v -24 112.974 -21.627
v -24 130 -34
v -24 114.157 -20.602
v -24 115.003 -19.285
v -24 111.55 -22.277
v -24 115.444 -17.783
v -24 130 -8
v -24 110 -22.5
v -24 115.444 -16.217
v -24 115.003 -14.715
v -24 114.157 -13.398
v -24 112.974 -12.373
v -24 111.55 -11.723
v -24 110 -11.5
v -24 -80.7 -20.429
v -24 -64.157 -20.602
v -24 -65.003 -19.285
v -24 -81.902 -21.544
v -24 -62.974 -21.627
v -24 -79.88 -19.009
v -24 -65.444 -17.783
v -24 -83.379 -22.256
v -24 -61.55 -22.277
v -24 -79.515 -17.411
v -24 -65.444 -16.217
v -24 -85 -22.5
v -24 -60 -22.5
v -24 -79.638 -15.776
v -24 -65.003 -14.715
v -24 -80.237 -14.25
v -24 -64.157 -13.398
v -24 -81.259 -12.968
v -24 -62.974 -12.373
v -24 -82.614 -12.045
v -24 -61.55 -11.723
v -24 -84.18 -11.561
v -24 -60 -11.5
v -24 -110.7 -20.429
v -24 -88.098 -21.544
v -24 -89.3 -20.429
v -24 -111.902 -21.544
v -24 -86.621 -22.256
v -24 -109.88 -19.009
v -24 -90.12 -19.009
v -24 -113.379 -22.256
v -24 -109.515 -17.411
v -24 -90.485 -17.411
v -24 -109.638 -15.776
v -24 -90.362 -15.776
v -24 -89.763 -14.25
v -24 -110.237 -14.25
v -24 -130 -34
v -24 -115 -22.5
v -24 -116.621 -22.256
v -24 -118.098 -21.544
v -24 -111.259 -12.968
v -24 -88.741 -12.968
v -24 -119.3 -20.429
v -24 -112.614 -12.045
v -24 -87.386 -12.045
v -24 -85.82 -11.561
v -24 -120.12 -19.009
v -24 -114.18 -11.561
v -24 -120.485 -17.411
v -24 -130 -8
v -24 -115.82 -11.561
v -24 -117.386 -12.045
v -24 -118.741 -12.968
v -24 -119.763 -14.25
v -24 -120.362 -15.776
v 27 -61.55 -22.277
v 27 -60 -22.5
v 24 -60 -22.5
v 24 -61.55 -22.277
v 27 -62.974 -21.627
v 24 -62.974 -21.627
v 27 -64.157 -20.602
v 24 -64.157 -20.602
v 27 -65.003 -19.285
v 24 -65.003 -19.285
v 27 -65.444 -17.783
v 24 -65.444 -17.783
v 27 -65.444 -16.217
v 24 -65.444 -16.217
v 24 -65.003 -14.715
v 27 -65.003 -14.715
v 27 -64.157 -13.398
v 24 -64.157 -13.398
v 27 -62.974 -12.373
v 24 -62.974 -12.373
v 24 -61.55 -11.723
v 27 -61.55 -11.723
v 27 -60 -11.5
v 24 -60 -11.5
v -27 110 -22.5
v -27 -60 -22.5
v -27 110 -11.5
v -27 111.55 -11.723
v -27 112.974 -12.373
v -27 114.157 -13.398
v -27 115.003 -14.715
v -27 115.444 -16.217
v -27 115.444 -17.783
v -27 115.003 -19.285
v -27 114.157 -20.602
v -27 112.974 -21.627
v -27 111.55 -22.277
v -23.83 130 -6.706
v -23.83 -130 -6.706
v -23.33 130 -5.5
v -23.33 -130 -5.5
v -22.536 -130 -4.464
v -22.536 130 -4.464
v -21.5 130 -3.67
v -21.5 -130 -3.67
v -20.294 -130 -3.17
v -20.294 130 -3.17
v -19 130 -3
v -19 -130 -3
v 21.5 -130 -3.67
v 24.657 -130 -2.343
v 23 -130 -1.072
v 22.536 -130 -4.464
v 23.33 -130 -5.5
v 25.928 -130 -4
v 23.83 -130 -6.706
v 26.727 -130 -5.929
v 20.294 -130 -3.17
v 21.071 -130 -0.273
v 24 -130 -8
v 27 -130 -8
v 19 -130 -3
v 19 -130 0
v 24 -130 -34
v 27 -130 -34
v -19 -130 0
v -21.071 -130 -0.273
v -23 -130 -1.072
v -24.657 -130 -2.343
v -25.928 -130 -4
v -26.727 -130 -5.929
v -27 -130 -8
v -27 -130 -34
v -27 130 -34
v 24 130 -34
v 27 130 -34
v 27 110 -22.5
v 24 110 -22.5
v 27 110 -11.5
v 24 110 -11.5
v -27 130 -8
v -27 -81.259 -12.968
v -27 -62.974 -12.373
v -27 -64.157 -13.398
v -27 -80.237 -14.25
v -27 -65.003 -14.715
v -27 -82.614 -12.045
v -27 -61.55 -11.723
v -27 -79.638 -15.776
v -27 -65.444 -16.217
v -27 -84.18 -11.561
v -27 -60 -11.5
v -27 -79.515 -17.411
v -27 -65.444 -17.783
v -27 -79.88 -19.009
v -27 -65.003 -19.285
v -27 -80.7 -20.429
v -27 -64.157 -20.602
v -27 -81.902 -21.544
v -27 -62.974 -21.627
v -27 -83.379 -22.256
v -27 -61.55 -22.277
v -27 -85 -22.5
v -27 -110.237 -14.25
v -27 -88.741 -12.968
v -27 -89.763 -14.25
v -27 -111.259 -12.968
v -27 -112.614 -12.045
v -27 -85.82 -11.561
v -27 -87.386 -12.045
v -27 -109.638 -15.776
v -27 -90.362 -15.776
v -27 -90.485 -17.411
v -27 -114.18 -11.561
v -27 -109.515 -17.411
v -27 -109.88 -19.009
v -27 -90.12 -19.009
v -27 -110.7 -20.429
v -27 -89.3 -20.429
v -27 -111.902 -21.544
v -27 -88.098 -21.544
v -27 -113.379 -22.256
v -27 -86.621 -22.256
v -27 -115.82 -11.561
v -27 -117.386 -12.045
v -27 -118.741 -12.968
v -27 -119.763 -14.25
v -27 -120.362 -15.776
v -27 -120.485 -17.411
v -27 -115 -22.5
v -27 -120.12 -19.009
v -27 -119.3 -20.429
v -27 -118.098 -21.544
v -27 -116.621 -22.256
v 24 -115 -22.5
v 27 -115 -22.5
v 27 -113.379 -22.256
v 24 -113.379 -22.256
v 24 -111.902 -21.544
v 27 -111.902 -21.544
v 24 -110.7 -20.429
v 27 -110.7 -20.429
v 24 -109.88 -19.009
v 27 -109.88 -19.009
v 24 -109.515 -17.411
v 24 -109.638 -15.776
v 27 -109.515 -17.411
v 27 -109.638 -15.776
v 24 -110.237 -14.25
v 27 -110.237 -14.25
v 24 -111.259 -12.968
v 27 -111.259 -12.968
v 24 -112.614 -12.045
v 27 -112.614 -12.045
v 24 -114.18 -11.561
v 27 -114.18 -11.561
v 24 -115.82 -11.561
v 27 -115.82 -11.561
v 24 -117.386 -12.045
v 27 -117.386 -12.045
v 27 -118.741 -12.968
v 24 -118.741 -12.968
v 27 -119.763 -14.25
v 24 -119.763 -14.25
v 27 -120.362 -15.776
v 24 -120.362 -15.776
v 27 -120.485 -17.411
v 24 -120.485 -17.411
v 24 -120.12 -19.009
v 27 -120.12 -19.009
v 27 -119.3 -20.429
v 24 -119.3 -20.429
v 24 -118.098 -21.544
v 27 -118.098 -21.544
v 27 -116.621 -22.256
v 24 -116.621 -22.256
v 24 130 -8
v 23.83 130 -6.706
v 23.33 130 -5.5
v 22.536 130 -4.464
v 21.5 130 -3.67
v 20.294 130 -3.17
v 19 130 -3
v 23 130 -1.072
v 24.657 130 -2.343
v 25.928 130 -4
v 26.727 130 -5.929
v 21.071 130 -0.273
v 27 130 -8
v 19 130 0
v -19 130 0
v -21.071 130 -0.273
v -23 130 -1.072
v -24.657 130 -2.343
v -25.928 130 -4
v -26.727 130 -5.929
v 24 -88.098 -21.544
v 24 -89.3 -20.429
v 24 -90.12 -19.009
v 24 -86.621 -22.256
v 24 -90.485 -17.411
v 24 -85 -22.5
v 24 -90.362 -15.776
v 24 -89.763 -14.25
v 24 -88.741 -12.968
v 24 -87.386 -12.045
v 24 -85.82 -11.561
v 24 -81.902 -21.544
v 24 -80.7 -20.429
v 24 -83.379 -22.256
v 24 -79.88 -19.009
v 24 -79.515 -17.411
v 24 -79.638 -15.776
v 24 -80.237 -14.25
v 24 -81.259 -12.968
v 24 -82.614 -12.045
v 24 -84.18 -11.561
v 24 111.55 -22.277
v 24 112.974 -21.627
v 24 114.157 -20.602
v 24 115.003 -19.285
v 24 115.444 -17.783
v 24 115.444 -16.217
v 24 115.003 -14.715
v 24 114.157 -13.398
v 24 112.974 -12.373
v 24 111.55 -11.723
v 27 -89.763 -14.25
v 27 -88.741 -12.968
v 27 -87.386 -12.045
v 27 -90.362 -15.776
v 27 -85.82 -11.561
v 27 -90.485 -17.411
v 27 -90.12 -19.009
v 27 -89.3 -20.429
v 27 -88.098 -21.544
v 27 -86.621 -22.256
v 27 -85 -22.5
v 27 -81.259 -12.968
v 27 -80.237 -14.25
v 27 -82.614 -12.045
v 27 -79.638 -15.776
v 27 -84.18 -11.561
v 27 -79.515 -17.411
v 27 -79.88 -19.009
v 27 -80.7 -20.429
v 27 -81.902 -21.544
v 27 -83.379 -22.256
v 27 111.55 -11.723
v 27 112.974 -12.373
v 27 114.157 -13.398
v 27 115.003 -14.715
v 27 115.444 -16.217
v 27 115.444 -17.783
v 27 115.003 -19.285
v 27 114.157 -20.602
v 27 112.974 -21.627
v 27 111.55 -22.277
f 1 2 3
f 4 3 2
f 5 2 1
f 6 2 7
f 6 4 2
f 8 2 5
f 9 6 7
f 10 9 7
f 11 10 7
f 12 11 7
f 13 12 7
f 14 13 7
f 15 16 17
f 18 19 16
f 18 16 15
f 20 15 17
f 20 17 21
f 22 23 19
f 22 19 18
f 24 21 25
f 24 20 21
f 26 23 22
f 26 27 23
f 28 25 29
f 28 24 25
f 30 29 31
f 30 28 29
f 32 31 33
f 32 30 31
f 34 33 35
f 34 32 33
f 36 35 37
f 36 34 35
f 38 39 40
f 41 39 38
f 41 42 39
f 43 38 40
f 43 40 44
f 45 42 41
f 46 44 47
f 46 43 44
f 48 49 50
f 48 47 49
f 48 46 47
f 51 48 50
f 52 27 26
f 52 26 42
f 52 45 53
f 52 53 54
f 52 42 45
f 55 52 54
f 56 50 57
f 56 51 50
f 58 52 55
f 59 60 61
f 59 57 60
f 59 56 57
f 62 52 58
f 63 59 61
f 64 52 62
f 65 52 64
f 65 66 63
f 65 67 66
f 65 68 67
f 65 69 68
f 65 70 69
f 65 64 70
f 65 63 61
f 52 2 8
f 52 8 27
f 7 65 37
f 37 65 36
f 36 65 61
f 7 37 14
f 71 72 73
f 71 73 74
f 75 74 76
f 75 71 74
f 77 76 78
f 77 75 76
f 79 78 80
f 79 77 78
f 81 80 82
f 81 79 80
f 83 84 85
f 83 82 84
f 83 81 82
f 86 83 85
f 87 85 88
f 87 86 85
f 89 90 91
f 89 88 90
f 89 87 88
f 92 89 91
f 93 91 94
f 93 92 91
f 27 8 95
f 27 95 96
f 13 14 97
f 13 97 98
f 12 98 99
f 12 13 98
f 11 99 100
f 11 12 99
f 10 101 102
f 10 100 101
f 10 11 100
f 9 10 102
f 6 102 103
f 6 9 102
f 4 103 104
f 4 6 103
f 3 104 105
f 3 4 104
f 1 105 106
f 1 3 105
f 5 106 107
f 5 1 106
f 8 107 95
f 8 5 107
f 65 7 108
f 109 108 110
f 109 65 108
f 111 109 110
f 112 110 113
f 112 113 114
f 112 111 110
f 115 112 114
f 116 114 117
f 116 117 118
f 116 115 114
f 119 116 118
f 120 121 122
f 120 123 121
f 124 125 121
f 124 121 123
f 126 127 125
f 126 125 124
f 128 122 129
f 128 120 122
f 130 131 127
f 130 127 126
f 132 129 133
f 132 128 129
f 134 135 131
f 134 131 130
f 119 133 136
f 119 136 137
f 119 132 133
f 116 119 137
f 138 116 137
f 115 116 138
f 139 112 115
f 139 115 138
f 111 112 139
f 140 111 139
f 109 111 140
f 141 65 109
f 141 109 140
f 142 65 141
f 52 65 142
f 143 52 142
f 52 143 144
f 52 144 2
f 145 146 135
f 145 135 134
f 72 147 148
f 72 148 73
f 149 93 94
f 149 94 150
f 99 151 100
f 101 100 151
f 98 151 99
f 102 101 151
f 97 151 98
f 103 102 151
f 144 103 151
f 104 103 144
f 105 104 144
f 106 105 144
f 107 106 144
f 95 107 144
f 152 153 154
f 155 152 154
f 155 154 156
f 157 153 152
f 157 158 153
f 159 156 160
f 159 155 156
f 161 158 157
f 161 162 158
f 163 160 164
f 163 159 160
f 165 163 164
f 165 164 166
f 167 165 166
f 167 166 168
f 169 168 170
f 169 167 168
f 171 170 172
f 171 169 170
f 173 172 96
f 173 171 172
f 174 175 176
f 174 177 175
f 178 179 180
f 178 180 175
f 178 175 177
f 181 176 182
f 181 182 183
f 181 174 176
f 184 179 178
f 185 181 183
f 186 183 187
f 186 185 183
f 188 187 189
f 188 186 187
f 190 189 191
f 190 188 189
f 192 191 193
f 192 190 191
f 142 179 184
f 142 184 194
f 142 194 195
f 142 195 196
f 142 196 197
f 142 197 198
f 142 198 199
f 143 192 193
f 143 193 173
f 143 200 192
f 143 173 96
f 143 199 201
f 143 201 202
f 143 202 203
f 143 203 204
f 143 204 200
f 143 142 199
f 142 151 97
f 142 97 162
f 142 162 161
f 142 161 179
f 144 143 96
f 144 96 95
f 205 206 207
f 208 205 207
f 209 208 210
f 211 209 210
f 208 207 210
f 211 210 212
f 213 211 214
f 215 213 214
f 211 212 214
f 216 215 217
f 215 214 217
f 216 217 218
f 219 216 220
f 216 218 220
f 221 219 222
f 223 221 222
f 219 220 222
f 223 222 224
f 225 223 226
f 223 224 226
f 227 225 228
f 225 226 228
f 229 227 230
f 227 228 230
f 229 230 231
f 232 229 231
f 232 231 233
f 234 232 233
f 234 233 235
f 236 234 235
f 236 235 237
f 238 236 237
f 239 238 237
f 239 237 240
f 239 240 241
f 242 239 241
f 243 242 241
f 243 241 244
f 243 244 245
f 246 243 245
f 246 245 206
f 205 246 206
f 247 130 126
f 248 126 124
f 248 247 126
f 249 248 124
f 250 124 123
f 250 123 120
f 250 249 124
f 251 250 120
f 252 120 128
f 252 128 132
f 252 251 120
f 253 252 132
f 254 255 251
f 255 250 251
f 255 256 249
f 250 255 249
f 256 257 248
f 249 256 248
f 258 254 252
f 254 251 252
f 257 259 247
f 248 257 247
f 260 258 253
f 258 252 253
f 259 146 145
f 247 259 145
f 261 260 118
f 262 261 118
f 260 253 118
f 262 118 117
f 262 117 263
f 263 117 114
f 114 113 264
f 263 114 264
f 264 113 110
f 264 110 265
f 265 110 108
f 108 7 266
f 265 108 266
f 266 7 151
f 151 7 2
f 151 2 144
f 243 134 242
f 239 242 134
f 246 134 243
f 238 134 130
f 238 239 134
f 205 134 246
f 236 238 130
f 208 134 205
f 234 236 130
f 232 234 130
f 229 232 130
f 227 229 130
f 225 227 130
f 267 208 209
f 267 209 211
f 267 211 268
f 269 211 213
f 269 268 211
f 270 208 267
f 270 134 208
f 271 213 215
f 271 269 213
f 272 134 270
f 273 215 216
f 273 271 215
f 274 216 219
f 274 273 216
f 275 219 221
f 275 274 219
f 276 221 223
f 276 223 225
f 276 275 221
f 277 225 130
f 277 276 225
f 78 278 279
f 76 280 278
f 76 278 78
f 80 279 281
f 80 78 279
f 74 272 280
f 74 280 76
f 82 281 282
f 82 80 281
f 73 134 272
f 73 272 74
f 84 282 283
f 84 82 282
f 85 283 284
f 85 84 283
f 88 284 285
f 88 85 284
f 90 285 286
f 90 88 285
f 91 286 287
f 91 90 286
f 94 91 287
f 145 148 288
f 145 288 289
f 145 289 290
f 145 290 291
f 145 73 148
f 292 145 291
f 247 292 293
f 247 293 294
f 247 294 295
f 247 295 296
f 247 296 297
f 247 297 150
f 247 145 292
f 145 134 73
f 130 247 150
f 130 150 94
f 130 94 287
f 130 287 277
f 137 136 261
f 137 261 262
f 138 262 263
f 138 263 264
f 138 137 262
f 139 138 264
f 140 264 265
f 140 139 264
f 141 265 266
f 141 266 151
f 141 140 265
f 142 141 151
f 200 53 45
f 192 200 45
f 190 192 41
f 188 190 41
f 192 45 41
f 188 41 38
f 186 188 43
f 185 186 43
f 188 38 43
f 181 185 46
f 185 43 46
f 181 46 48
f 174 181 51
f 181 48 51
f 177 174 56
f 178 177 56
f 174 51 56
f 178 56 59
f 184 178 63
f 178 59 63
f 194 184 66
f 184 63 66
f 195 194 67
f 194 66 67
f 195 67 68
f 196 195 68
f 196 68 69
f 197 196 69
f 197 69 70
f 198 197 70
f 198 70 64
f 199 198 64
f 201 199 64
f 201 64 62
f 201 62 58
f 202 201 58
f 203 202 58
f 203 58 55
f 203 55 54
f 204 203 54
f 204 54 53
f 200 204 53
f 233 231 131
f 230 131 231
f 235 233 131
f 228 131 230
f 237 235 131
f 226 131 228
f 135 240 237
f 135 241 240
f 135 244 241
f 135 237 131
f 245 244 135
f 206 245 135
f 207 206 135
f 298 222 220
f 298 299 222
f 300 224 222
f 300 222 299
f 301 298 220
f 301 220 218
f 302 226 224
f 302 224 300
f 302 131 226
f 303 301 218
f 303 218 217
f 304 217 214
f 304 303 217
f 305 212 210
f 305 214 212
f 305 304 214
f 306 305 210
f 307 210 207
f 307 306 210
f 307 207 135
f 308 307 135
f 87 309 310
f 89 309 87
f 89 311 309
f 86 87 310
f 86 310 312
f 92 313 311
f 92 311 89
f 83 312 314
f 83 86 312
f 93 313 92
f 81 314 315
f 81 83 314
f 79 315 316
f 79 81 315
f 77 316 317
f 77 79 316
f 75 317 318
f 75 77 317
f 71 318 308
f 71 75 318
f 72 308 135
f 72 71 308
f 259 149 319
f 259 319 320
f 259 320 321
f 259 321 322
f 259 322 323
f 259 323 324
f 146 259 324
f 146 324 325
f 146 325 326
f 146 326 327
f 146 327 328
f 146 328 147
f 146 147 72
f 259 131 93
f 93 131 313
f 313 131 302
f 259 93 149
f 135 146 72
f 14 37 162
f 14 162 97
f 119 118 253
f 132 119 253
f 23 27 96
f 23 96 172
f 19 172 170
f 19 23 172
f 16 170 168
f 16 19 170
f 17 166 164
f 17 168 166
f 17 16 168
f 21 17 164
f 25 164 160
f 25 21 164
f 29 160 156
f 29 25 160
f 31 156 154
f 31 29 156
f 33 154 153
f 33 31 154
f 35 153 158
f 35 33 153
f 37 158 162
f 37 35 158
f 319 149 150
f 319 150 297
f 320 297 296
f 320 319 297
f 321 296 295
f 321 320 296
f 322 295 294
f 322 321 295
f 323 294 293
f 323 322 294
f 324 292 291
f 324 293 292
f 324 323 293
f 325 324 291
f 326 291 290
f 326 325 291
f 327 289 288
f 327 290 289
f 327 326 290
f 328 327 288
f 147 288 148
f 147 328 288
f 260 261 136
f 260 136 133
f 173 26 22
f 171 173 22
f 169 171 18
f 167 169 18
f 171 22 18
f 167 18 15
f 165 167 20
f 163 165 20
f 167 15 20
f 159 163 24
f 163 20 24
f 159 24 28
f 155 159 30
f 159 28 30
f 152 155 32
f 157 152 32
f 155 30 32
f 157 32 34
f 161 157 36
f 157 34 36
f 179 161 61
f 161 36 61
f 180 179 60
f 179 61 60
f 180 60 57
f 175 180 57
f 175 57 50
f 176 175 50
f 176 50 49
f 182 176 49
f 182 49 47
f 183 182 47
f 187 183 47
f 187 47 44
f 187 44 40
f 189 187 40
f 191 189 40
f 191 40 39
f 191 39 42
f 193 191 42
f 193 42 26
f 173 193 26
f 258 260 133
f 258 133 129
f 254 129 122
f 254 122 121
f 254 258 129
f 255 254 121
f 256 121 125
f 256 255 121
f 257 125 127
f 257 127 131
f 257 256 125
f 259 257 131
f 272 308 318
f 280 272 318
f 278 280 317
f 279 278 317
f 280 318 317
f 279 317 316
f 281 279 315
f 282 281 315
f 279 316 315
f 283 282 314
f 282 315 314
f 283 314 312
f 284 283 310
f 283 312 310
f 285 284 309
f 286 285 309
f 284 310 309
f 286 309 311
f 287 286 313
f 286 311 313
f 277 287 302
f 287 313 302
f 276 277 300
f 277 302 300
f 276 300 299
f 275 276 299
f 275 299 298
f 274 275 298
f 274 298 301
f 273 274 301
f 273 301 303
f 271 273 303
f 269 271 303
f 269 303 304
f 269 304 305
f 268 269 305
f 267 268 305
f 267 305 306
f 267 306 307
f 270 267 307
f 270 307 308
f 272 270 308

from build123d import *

# Parameters (mm, degrees)
SKETCH1_W                      = 54
SKETCH1_H                      = 260
BASE_FLANGE1_DEPTH             = 3
EDGE_FLANGE1_STRIP_W           = 22
EDGE_FLANGE1_STRIP_H           = 3
EDGE_FLANGE1_STRIP_CUT_DEPTH   = 260
EDGE_FLANGE1_STRIP_2_W         = 22
EDGE_FLANGE1_STRIP_2_H         = 3
EDGE_FLANGE1_STRIP_CUT_2_DEPTH = 260
EDGE_FLANGE1_DEPTH             = 260
EDGE_FLANGE1_BEND_DEPTH        = 260
CUT_EXTRUDE1_DEPTH             = 145.817126059
SKETCH20_R                     = 5.5
CUT_EXTRUDE2_DEPTH             = 145.817126059


# Sheet-metal steps are written as plain solids
with BuildPart() as part:
    # Sketch1 → Base-Flange1 (new body)
    with BuildSketch(Plane.XY):
        Rectangle(SKETCH1_W, SKETCH1_H)
    extrude(amount=-BASE_FLANGE1_DEPTH)

    # Edge-Flange1 strip (across the edge) → Edge-Flange1 strip cut (cut)
    with BuildSketch(Plane(origin=(27, 130, -3), x_dir=(-1, 0, 0), z_dir=(0, -1, 0))):
        with Locations((-3, -1.5)):
            Rectangle(EDGE_FLANGE1_STRIP_W, EDGE_FLANGE1_STRIP_H)
    extrude(amount=EDGE_FLANGE1_STRIP_CUT_DEPTH, mode=Mode.SUBTRACT)

    # Edge-Flange1 strip 2 (across the edge) → Edge-Flange1 strip cut 2 (cut)
    with BuildSketch(Plane(origin=(-27, -130, -3), x_dir=(1, 0, 0), z_dir=(0, 1, 0))):
        with Locations((-3, -1.5)):
            Rectangle(EDGE_FLANGE1_STRIP_2_W, EDGE_FLANGE1_STRIP_2_H)
    extrude(amount=EDGE_FLANGE1_STRIP_CUT_2_DEPTH, mode=Mode.SUBTRACT)

    # Edge-Flange1 section (across the edge) → Edge-Flange1 (add)
    with BuildSketch(Plane(origin=(27, 130, -3), x_dir=(-1, 0, 0), z_dir=(0, -1, 0))):
        with BuildLine():
            Line((0, 5), (0, 31))
            Line((0, 31), (3, 31))
            Line((3, 31), (3, 5))
            ThreePointArc((3, 5), (4.464466094, 1.464466094), (8, 0))
            Line((8, 0), (8, -3))
            ThreePointArc((8, -3), (2.343145751, -0.656854249), (0, 5))
        make_face()
    extrude(amount=EDGE_FLANGE1_DEPTH)

    # Edge-Flange1 section 2 (across the edge) → Edge-Flange1 bend (add)
    with BuildSketch(Plane(origin=(-27, -130, -3), x_dir=(1, 0, 0), z_dir=(0, 1, 0))):
        with BuildLine():
            Line((0, 5), (0, 31))
            Line((0, 31), (3, 31))
            Line((3, 31), (3, 5))
            ThreePointArc((3, 5), (4.464466094, 1.464466094), (8, 0))
            Line((8, 0), (8, -3))
            ThreePointArc((8, -3), (2.343145751, -0.656854249), (0, 5))
        make_face()
    extrude(amount=EDGE_FLANGE1_BEND_DEPTH)

    # Sketch18 → Cut-Extrude1 (cut, through all)
    with BuildSketch(Plane(origin=(27, 0, 0), x_dir=(0, 0, -1), z_dir=(1, 0, 0))):
        with BuildLine():
            Line((11.5, -60), (11.5, 110))
            ThreePointArc((11.5, 110), (17, 115.5), (22.5, 110))
            Line((22.5, 110), (22.5, -60))
            ThreePointArc((22.5, -60), (17, -65.5), (11.5, -60))
        make_face()
    extrude(amount=-CUT_EXTRUDE1_DEPTH, mode=Mode.SUBTRACT)

    # Sketch20 → Cut-Extrude2 (cut, through all)
    with BuildSketch(Plane(origin=(27, 0, 0), x_dir=(0, 0, -1), z_dir=(1, 0, 0))):
        with Locations((17, -115)):
            Circle(SKETCH20_R)
        with Locations((17, -85)):
            Circle(SKETCH20_R)
    extrude(amount=-CUT_EXTRUDE2_DEPTH, mode=Mode.SUBTRACT)


solid = part.part
